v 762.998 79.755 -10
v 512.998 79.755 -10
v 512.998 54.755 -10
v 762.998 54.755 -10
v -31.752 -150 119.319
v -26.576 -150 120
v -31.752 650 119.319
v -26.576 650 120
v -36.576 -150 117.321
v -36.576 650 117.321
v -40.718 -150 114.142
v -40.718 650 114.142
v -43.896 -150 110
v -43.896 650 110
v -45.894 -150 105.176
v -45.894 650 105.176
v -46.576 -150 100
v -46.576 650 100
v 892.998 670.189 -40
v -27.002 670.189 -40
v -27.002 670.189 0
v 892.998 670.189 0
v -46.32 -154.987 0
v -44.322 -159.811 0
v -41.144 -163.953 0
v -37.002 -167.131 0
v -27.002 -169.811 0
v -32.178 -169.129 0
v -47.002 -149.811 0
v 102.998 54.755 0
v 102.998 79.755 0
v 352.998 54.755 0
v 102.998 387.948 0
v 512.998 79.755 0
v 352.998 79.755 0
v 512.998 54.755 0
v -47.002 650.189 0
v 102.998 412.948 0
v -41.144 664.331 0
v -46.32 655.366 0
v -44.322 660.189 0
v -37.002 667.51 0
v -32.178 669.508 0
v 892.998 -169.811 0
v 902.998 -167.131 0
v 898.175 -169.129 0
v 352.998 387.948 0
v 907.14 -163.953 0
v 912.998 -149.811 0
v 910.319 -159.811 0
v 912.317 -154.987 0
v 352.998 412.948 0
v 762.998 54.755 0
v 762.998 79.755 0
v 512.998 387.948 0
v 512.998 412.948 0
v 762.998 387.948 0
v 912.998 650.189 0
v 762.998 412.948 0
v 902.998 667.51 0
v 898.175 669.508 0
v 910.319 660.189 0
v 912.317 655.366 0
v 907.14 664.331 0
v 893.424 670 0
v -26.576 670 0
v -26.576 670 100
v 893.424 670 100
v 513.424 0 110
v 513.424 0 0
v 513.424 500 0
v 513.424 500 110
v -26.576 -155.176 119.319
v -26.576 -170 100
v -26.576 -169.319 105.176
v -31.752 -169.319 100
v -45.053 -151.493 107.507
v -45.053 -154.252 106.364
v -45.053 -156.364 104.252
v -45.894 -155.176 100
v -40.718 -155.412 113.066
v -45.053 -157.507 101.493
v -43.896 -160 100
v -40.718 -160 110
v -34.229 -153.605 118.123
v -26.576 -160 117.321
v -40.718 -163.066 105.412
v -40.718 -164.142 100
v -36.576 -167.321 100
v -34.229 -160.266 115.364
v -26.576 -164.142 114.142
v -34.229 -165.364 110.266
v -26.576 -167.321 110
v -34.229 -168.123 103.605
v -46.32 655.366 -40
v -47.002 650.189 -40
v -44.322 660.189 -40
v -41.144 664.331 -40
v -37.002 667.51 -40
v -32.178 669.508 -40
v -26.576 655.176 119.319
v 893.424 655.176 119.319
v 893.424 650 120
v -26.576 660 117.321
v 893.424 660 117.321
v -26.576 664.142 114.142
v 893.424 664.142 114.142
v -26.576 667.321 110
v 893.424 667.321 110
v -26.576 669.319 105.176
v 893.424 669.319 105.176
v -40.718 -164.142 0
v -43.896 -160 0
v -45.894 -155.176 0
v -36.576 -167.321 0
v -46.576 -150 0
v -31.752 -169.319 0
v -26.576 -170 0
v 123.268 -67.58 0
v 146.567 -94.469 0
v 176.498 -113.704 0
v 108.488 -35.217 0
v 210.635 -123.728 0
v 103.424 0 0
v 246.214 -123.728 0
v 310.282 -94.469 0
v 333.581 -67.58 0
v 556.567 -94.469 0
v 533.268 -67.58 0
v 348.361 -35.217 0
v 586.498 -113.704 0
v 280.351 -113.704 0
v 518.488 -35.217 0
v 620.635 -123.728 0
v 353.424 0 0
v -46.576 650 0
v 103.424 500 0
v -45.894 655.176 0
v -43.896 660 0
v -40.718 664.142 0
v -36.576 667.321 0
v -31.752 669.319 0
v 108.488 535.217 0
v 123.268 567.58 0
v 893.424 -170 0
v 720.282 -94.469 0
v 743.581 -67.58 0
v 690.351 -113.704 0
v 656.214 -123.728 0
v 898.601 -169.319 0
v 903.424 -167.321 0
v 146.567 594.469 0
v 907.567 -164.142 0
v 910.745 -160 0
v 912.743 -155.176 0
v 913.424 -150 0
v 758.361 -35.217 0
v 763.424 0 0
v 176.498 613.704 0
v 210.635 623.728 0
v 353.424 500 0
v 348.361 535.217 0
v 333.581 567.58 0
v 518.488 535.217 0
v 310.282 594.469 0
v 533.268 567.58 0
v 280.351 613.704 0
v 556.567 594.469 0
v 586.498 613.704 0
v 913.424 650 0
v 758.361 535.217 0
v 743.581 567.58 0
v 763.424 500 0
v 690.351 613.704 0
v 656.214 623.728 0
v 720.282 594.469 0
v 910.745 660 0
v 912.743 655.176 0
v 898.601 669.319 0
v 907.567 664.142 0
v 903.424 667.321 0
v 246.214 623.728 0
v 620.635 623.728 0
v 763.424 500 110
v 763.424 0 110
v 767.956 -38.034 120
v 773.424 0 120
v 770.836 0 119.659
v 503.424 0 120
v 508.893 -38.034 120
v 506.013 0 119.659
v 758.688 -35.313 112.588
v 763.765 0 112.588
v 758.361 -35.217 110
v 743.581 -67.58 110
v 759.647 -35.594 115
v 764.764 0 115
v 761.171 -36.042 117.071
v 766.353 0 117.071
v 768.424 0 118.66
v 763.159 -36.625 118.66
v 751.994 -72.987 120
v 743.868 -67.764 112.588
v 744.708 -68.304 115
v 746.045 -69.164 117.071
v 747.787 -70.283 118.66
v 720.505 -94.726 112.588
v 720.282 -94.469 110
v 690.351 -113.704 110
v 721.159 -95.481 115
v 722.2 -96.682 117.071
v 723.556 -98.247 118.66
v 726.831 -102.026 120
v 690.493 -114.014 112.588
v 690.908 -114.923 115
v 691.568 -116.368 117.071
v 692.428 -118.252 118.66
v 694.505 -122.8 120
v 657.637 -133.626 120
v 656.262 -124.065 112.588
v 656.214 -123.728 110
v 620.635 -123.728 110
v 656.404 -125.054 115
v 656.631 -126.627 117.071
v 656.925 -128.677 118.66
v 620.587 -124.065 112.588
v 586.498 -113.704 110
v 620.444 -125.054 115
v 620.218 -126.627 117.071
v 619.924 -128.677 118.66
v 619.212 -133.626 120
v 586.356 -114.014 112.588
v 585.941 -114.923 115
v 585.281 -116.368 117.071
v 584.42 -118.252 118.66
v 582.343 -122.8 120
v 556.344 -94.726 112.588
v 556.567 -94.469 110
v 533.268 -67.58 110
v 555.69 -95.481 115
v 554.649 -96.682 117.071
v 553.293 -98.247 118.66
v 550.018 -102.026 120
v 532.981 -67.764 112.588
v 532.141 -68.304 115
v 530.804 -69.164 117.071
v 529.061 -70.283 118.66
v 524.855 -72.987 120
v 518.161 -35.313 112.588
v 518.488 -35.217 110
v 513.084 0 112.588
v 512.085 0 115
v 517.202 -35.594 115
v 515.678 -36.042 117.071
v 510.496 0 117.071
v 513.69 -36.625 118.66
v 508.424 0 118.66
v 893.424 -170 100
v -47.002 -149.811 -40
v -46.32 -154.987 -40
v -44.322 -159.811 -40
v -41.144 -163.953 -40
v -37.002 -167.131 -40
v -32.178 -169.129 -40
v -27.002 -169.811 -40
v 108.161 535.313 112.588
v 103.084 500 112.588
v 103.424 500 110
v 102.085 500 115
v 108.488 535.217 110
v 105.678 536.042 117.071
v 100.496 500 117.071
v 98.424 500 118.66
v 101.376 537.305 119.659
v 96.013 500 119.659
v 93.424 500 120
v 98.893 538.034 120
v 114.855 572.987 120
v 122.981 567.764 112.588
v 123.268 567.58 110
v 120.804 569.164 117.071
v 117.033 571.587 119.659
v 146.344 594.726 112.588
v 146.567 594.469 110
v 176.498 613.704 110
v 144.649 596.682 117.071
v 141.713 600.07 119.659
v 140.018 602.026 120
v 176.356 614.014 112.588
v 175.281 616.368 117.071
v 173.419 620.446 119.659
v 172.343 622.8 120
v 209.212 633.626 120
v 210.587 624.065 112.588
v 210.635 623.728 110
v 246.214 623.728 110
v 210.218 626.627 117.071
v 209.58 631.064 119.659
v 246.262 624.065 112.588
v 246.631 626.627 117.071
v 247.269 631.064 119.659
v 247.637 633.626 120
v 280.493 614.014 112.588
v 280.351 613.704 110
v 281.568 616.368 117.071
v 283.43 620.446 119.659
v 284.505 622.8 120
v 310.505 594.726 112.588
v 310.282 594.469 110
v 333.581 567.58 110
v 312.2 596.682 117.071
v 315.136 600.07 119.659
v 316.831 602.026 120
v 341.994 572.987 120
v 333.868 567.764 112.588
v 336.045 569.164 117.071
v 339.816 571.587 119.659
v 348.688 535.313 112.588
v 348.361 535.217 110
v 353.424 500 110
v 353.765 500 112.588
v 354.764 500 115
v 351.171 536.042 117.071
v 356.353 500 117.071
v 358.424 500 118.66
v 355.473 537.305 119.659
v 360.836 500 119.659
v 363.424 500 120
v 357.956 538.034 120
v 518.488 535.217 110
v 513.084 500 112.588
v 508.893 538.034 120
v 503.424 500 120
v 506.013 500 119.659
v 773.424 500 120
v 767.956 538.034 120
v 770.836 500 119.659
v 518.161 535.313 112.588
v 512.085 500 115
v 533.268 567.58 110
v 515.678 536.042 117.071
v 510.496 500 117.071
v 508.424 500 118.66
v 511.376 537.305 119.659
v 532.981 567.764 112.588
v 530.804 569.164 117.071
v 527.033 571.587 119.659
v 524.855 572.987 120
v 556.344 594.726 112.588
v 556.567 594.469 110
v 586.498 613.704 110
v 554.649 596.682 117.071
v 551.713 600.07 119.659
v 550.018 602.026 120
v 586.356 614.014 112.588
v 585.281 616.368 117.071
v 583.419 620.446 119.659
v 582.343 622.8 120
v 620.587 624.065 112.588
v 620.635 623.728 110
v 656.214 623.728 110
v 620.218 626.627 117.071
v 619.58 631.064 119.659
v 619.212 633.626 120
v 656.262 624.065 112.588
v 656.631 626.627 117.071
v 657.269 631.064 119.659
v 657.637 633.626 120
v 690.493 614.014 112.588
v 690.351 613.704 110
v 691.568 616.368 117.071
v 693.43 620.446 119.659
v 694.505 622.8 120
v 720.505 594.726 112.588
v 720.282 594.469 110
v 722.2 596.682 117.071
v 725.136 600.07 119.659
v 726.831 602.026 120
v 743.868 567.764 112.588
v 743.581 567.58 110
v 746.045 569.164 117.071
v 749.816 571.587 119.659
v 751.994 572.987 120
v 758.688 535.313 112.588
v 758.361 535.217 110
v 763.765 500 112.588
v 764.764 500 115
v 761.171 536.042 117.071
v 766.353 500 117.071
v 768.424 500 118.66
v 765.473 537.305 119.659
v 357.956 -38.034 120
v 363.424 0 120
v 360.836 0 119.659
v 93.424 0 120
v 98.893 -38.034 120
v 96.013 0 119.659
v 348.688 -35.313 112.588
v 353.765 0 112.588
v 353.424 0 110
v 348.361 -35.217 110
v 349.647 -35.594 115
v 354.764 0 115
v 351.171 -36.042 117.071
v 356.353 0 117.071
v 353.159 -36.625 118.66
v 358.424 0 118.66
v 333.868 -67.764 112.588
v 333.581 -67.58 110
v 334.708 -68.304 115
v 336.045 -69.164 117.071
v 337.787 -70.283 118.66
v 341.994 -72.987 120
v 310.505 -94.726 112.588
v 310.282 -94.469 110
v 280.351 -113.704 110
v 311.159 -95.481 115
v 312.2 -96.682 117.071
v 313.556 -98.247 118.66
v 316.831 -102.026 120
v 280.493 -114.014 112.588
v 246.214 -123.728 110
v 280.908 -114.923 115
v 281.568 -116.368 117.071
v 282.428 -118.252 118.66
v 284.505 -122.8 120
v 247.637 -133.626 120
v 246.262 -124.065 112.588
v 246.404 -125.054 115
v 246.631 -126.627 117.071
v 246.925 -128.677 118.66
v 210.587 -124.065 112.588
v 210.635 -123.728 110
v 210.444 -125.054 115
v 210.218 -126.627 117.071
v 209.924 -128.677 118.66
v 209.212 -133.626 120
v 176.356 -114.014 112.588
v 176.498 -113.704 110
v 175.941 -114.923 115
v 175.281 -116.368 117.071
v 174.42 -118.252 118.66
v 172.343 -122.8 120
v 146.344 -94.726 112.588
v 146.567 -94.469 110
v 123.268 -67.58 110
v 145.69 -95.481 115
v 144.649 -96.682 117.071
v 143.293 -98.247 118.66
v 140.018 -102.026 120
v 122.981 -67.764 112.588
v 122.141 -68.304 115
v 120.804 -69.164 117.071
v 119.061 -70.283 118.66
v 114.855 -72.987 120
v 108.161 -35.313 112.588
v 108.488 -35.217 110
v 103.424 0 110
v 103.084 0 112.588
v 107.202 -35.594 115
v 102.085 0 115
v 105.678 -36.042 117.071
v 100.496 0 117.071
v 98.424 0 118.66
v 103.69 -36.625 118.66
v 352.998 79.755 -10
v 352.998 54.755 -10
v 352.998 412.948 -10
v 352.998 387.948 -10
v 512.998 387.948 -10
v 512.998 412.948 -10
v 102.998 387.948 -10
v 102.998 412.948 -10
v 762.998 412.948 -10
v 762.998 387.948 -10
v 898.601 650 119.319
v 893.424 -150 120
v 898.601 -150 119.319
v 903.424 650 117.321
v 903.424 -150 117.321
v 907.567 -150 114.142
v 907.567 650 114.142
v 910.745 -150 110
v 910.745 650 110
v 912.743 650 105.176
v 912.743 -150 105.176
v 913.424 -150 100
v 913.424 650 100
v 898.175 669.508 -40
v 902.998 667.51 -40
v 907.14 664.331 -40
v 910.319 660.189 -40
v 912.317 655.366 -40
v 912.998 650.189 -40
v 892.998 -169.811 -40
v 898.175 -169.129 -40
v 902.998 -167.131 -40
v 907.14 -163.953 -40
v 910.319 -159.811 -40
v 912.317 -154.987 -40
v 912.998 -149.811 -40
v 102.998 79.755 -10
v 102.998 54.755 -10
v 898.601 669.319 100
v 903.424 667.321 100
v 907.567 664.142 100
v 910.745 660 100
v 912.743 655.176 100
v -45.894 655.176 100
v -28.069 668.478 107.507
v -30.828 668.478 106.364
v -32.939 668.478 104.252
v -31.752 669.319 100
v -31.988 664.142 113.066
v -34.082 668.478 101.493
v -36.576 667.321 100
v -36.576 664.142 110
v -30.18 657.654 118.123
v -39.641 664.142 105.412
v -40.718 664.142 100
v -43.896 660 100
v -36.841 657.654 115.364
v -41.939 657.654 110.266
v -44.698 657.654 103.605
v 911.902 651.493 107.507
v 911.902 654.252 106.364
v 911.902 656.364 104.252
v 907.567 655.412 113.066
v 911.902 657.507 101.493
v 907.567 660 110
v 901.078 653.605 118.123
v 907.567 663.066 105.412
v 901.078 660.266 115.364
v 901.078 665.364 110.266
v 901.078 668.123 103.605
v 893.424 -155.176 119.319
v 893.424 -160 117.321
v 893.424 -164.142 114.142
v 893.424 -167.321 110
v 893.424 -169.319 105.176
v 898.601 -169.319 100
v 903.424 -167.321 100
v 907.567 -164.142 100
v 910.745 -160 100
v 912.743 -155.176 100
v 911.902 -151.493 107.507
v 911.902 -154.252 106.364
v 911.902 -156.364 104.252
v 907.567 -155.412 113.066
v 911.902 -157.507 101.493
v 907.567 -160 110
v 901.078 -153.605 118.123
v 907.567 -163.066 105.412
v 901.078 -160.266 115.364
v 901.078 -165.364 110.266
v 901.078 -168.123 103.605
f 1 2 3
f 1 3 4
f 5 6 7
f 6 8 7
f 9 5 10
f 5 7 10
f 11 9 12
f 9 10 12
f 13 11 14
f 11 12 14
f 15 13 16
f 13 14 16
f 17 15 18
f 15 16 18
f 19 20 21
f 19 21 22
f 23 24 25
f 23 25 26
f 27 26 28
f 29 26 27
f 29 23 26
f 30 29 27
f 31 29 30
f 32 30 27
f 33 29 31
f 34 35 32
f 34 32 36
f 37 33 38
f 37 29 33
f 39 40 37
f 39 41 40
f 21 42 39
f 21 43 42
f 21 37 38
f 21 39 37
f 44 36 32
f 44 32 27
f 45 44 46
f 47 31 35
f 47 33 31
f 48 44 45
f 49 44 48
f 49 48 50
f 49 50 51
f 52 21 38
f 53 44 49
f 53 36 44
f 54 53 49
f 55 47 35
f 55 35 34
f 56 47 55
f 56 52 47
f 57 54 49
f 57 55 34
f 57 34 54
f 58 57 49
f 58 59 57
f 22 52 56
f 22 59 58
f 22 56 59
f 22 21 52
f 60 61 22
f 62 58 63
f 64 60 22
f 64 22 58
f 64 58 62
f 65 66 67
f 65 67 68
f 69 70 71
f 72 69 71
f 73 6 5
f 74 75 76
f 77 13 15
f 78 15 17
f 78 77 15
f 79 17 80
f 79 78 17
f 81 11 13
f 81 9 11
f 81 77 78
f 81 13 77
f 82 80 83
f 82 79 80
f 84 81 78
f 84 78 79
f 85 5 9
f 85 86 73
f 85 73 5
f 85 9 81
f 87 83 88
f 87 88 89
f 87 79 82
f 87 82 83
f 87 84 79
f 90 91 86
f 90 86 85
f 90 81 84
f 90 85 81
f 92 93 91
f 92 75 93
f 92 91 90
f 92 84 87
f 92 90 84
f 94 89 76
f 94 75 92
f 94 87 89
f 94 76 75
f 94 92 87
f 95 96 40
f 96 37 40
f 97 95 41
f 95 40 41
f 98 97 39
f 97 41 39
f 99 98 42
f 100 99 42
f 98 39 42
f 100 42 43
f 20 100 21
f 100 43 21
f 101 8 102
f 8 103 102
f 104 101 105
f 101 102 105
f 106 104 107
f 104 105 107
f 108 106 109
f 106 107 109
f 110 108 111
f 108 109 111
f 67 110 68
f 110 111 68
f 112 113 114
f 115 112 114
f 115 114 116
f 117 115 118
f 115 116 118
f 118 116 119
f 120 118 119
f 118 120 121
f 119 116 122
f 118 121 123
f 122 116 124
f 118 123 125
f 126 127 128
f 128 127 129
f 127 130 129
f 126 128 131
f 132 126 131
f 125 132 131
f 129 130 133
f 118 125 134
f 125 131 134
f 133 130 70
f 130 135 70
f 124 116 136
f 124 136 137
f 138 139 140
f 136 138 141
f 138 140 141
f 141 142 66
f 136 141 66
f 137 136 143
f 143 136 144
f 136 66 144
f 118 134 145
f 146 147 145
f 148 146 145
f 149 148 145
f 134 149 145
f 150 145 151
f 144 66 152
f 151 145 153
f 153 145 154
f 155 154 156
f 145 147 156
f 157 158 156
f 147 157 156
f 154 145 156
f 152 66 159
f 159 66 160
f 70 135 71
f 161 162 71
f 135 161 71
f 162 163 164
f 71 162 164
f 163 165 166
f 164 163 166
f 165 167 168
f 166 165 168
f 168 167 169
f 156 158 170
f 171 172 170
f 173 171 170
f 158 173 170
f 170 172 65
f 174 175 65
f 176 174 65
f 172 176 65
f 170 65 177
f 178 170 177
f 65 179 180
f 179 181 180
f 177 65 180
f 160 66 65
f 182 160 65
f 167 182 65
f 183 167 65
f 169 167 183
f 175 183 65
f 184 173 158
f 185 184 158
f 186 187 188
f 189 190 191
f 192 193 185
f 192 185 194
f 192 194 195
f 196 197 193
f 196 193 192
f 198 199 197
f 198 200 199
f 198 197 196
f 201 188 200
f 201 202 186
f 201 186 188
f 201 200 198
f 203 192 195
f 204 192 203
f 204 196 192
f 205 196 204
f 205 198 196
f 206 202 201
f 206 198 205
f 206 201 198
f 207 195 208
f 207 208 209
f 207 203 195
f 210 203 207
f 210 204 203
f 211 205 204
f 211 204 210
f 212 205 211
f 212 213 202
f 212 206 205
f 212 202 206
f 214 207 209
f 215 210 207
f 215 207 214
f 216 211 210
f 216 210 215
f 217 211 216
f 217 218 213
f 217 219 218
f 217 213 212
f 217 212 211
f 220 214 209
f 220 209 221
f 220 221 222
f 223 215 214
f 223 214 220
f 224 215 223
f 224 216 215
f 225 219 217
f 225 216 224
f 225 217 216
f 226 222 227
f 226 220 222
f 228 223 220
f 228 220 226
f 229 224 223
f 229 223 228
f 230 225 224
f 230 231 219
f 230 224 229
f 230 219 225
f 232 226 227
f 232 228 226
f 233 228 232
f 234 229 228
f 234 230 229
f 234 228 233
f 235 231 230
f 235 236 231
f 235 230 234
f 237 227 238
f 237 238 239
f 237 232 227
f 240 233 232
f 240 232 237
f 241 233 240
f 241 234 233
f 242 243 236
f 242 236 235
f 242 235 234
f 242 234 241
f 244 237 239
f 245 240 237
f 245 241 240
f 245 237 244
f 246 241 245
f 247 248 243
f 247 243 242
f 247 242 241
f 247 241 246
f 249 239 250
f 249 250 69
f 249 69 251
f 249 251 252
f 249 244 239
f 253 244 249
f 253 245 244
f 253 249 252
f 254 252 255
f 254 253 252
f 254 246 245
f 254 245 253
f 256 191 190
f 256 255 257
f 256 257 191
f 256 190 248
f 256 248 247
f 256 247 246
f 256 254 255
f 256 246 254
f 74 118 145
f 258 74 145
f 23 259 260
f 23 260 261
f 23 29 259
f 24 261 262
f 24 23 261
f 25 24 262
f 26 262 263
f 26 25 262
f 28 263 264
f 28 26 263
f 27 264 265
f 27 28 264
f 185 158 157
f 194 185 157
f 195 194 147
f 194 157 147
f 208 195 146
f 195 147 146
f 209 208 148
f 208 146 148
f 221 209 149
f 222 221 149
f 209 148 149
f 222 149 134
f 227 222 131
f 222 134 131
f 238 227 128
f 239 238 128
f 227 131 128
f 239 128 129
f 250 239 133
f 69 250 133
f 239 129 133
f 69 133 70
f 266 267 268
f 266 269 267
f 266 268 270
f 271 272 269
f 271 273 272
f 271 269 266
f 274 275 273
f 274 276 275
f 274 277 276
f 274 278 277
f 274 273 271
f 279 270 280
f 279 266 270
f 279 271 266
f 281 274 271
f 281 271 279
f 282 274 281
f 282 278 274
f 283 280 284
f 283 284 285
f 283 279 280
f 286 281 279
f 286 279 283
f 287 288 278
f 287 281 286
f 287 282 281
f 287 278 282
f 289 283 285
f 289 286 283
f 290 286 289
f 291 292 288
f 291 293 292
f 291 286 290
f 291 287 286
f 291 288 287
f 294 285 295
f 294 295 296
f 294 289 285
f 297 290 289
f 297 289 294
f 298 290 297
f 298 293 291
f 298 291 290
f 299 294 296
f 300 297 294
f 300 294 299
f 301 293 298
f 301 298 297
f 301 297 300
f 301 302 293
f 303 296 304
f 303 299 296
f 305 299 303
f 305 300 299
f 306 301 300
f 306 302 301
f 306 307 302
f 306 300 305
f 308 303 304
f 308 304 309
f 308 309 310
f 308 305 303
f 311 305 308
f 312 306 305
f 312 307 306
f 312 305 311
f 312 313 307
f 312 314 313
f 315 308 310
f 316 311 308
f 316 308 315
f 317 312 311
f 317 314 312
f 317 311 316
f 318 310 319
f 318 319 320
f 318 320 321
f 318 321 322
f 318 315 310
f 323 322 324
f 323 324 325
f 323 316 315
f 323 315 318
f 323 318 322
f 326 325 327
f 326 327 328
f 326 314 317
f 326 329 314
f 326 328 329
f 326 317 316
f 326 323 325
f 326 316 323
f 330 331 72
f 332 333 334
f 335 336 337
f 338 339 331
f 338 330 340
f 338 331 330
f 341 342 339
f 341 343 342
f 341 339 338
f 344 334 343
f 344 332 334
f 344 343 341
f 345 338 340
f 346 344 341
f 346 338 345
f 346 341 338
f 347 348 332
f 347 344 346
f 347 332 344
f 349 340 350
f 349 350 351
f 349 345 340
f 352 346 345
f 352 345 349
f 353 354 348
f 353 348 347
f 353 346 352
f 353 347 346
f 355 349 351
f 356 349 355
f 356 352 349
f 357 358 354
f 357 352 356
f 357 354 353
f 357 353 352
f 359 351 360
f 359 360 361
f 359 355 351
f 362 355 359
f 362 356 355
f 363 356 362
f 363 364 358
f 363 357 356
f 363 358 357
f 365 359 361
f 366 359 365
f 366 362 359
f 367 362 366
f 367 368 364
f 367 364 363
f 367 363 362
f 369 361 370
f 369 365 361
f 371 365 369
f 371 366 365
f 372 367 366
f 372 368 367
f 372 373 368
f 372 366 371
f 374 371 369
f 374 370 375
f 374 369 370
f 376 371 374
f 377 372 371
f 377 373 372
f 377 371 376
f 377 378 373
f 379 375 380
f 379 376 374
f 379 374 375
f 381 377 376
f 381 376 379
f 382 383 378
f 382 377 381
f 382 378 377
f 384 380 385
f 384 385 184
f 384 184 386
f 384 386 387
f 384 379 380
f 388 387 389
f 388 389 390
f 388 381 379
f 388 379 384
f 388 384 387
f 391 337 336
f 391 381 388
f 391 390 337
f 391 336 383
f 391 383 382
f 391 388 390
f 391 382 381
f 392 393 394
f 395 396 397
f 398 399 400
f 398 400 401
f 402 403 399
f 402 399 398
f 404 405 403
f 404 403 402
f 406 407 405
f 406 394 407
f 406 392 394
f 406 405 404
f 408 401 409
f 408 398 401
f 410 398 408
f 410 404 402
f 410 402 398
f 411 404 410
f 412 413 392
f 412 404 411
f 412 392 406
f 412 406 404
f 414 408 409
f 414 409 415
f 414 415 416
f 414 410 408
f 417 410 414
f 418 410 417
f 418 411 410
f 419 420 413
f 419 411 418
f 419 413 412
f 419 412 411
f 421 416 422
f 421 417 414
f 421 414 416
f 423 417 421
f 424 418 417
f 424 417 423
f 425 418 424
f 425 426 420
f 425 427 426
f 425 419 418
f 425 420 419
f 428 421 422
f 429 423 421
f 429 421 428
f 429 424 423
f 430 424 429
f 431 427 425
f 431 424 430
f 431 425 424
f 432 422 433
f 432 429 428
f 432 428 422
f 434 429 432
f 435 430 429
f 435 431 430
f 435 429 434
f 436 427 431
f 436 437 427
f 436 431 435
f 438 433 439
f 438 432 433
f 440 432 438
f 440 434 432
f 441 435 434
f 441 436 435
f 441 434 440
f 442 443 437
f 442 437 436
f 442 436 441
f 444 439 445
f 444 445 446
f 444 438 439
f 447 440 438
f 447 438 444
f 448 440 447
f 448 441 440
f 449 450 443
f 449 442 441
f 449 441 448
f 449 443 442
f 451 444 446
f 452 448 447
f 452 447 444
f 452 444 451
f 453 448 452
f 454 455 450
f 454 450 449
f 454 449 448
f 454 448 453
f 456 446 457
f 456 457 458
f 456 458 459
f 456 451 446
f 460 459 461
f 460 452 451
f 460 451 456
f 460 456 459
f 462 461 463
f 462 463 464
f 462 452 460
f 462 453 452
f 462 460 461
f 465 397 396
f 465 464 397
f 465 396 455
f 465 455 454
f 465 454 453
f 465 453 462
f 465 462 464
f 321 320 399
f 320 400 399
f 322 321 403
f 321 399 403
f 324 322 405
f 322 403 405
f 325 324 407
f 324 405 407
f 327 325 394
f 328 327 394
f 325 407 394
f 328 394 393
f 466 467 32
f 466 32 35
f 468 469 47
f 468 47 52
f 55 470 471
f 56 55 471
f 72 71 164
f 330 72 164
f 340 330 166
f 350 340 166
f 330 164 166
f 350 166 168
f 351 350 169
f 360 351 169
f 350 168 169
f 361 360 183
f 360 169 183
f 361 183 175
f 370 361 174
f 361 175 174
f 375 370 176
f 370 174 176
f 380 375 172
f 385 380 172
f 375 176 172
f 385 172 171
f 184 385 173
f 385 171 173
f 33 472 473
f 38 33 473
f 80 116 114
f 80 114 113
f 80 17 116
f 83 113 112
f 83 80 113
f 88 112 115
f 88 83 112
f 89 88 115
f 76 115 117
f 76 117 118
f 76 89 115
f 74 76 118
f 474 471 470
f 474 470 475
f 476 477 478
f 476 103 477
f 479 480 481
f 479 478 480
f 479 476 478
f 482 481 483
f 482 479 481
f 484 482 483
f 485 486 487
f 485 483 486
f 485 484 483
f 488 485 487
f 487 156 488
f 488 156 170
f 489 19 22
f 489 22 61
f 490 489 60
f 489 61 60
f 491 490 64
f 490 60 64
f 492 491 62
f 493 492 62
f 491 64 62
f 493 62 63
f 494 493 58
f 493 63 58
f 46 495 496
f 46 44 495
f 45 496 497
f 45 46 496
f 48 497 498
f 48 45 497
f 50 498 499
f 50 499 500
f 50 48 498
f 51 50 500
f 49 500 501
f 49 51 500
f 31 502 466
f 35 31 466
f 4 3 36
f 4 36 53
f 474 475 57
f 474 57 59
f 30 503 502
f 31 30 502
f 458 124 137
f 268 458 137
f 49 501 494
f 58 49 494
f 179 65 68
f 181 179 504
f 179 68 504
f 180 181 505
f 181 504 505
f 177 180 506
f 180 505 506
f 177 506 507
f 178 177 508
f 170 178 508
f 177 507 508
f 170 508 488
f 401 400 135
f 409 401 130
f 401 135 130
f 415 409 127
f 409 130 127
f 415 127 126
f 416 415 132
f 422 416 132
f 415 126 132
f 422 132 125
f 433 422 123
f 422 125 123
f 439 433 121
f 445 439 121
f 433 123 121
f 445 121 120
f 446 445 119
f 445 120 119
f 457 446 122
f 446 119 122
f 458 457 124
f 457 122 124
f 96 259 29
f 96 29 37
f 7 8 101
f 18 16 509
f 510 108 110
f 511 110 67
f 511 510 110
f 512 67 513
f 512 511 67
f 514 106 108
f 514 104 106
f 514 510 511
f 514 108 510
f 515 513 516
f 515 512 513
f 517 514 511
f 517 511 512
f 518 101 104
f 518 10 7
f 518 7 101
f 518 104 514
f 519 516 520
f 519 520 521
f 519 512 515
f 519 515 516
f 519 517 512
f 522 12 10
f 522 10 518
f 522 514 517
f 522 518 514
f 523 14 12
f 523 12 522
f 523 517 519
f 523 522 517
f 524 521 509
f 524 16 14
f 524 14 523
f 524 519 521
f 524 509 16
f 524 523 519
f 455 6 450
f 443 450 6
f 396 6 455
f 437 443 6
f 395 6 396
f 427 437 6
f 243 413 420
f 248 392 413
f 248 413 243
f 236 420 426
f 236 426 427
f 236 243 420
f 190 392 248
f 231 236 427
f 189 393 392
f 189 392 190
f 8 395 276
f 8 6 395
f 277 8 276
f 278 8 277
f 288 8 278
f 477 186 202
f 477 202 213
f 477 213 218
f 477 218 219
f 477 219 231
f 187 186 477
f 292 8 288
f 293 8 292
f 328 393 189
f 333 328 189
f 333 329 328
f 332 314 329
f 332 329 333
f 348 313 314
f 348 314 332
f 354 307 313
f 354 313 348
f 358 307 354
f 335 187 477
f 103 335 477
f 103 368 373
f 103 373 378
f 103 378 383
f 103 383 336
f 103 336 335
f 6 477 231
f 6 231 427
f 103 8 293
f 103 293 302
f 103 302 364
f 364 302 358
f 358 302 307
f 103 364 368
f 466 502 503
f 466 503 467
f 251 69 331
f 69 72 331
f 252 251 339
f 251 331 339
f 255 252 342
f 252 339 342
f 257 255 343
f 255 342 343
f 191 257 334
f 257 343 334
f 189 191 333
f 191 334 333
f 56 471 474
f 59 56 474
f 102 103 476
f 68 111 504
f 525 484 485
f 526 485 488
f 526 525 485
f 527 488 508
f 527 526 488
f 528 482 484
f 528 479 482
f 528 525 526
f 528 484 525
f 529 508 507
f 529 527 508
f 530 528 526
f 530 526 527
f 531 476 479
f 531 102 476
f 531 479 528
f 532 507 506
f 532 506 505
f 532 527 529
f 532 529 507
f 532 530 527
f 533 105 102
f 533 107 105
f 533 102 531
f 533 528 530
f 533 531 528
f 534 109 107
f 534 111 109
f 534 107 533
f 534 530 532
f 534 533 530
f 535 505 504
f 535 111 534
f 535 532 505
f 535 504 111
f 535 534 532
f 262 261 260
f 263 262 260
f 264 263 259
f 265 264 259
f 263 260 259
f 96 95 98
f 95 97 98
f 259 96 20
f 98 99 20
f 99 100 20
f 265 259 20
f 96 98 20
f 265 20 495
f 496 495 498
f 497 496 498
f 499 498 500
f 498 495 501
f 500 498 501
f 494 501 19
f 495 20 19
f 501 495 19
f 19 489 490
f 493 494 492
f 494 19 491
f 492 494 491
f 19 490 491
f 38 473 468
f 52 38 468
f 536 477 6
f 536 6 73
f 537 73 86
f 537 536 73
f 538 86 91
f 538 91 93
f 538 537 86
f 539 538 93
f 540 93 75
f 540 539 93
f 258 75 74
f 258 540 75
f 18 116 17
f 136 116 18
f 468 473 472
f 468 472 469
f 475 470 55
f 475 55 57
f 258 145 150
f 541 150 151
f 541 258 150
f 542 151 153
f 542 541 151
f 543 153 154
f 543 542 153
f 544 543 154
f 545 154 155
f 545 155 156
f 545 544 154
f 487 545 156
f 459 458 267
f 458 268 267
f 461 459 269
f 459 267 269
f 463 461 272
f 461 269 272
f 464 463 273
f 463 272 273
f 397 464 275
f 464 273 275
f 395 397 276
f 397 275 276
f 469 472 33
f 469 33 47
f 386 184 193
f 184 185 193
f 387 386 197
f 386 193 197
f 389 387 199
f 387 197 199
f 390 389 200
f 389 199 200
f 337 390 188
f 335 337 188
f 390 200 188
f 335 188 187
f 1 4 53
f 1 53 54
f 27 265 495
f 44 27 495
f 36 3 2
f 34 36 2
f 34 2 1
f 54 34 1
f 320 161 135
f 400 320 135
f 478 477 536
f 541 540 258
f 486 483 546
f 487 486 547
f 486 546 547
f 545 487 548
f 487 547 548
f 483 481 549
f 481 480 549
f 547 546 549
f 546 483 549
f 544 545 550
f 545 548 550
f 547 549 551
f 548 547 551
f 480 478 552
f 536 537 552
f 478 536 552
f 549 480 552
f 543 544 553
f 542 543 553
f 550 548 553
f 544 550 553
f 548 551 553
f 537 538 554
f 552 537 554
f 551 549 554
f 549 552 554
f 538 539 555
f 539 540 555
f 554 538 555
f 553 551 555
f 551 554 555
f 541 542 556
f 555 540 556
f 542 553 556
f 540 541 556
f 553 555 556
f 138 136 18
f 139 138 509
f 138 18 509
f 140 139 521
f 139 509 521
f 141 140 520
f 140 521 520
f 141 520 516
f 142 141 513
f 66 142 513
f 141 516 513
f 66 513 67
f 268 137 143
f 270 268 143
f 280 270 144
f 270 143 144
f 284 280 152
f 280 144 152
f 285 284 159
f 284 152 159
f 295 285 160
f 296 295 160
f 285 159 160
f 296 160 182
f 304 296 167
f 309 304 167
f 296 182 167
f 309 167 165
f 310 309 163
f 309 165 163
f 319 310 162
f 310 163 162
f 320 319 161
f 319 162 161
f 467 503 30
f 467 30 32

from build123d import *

# Parameters (mm, degrees)
F0_W     = 960
F0_H     = 840
F1_DEPTH = 120
F3_W     = 960
F3_H     = 840
F3_W_2   = 250
F3_H_2   = 25
F4_DEPTH = 40
F5_DEPTH = 30
F6_R     = 10
F7_R     = 20
F7_2_R   = 20


with BuildPart() as f1:
    # F0 (on Top) → F1 (new body)
    with BuildSketch(Plane.XY):
        with Locations((433.4244423313, 250)):
            Rectangle(F0_W, F0_H)
        with BuildLine():
            Line((103.4244423313, 420.3051773067), (103.4244423313, 500.0000000002))
            ThreePointArc((103.4244423313, 500.0000000002), (140.0360946831, 588.3883476484), (228.4244423313, 625))
            ThreePointArc((228.4244423313, 625), (316.8127899797, 588.3883476483), (353.4244423313, 500))
            Line((353.4244423313, 500), (353.4244423313, 420.1408478891))
            Line((353.4244423313, 420.1408478891), (353.4244423313, 419.9584157775))
            Line((353.4244423313, 419.9584157775), (353.4244423313, 0))
            ThreePointArc((353.4244423313, 0), (316.8127899796, -88.3883476482), (228.4244423313, -124.9999999998))
            ThreePointArc((228.4244423313, -124.9999999998), (140.036094683, -88.3883476481), (103.4244423313, 2e-10))
            Line((103.4244423313, 2e-10), (103.4244423313, 420))
            Line((103.4244423313, 420), (103.4244423313, 420.1321723057))
            Line((103.4244423313, 420.1321723057), (103.4244423313, 420.3051773067))
        make_face(mode=Mode.SUBTRACT)
        with BuildLine():
            Line((513.4244423313, 0), (513.4244423313, 500))
            ThreePointArc((513.4244423313, 500), (550.036094683, 588.3883476483), (638.4244423313, 625))
            ThreePointArc((638.4244423313, 625), (726.8127899797, 588.3883476483), (763.4244423313, 500))
            Line((763.4244423313, 500), (763.4244423313, 0))
            ThreePointArc((763.4244423313, 0), (726.8127899797, -88.3883476483), (638.4244423313, -125))
            ThreePointArc((638.4244423313, -125), (550.036094683, -88.3883476483), (513.4244423313, 0))
        make_face(mode=Mode.SUBTRACT)
    extrude(amount=F1_DEPTH)

    # F6
    f6_edges = [f1.edges().sort_by_distance(p)[0] for p in [
        (353.424442, 250, 120),
        (763.424442, 250, 120),
    ]]
    fillet(f6_edges, radius=F6_R)

    # F7
    f7_edges = [f1.edges().sort_by_distance(p)[0] for p in [
        (433.424442, -170, 120),
        (-46.575558, 250, 120),
        (433.424442, 670, 120),
        (913.424442, 250, 120),
        (-46.575558, -170, 60),
        (913.424442, -170, 60),
        (913.424442, 670, 60),
        (-46.575558, 670, 60),
    ]]
    fillet(f7_edges, radius=F7_R)


with BuildPart() as f4:
    # F3 (on offset) → F4 (new body)
    with BuildSketch(Plane.XY.offset(-40)):
        with Locations((432.9981575906, 250.189127326)):
            Rectangle(F3_W, F3_H)
        with Locations((227.9981575906, 67.2548420727)):
            Rectangle(F3_W_2, F3_H_2, mode=Mode.SUBTRACT)
        with Locations((637.9981575906, 67.2548420727)):
            Rectangle(F3_W_2, F3_H_2, mode=Mode.SUBTRACT)
        with Locations((227.9981575906, 400.4480063915)):
            Rectangle(F3_W_2, F3_H_2, mode=Mode.SUBTRACT)
        with Locations((637.9981575906, 400.4480063915)):
            Rectangle(F3_W_2, F3_H_2, mode=Mode.SUBTRACT)
    extrude(amount=F4_DEPTH)

    # F3 (on offset) → F5 (join)
    with BuildSketch(Plane.XY.offset(-40)):
        with Locations((227.9981575906, 400.4480063915)):
            Rectangle(F3_W_2, F3_H_2)
        with Locations((637.9981575906, 400.4480063915)):
            Rectangle(F3_W_2, F3_H_2)
        with Locations((227.9981575906, 67.2548420727)):
            Rectangle(F3_W_2, F3_H_2)
        with Locations((637.9981575906, 67.2548420727)):
            Rectangle(F3_W_2, F3_H_2)
    extrude(amount=F5_DEPTH)

    # F7#2
    f7_2_edges = [f4.edges().sort_by_distance(p)[0] for p in [
        (-47.001842, -169.810873, -20),
        (912.998158, -169.810873, -20),
        (912.998158, 670.189127, -20),
        (-47.001842, 670.189127, -20),
    ]]
    fillet(f7_2_edges, radius=F7_2_R)


solid = Compound([f1.part, f4.part])
